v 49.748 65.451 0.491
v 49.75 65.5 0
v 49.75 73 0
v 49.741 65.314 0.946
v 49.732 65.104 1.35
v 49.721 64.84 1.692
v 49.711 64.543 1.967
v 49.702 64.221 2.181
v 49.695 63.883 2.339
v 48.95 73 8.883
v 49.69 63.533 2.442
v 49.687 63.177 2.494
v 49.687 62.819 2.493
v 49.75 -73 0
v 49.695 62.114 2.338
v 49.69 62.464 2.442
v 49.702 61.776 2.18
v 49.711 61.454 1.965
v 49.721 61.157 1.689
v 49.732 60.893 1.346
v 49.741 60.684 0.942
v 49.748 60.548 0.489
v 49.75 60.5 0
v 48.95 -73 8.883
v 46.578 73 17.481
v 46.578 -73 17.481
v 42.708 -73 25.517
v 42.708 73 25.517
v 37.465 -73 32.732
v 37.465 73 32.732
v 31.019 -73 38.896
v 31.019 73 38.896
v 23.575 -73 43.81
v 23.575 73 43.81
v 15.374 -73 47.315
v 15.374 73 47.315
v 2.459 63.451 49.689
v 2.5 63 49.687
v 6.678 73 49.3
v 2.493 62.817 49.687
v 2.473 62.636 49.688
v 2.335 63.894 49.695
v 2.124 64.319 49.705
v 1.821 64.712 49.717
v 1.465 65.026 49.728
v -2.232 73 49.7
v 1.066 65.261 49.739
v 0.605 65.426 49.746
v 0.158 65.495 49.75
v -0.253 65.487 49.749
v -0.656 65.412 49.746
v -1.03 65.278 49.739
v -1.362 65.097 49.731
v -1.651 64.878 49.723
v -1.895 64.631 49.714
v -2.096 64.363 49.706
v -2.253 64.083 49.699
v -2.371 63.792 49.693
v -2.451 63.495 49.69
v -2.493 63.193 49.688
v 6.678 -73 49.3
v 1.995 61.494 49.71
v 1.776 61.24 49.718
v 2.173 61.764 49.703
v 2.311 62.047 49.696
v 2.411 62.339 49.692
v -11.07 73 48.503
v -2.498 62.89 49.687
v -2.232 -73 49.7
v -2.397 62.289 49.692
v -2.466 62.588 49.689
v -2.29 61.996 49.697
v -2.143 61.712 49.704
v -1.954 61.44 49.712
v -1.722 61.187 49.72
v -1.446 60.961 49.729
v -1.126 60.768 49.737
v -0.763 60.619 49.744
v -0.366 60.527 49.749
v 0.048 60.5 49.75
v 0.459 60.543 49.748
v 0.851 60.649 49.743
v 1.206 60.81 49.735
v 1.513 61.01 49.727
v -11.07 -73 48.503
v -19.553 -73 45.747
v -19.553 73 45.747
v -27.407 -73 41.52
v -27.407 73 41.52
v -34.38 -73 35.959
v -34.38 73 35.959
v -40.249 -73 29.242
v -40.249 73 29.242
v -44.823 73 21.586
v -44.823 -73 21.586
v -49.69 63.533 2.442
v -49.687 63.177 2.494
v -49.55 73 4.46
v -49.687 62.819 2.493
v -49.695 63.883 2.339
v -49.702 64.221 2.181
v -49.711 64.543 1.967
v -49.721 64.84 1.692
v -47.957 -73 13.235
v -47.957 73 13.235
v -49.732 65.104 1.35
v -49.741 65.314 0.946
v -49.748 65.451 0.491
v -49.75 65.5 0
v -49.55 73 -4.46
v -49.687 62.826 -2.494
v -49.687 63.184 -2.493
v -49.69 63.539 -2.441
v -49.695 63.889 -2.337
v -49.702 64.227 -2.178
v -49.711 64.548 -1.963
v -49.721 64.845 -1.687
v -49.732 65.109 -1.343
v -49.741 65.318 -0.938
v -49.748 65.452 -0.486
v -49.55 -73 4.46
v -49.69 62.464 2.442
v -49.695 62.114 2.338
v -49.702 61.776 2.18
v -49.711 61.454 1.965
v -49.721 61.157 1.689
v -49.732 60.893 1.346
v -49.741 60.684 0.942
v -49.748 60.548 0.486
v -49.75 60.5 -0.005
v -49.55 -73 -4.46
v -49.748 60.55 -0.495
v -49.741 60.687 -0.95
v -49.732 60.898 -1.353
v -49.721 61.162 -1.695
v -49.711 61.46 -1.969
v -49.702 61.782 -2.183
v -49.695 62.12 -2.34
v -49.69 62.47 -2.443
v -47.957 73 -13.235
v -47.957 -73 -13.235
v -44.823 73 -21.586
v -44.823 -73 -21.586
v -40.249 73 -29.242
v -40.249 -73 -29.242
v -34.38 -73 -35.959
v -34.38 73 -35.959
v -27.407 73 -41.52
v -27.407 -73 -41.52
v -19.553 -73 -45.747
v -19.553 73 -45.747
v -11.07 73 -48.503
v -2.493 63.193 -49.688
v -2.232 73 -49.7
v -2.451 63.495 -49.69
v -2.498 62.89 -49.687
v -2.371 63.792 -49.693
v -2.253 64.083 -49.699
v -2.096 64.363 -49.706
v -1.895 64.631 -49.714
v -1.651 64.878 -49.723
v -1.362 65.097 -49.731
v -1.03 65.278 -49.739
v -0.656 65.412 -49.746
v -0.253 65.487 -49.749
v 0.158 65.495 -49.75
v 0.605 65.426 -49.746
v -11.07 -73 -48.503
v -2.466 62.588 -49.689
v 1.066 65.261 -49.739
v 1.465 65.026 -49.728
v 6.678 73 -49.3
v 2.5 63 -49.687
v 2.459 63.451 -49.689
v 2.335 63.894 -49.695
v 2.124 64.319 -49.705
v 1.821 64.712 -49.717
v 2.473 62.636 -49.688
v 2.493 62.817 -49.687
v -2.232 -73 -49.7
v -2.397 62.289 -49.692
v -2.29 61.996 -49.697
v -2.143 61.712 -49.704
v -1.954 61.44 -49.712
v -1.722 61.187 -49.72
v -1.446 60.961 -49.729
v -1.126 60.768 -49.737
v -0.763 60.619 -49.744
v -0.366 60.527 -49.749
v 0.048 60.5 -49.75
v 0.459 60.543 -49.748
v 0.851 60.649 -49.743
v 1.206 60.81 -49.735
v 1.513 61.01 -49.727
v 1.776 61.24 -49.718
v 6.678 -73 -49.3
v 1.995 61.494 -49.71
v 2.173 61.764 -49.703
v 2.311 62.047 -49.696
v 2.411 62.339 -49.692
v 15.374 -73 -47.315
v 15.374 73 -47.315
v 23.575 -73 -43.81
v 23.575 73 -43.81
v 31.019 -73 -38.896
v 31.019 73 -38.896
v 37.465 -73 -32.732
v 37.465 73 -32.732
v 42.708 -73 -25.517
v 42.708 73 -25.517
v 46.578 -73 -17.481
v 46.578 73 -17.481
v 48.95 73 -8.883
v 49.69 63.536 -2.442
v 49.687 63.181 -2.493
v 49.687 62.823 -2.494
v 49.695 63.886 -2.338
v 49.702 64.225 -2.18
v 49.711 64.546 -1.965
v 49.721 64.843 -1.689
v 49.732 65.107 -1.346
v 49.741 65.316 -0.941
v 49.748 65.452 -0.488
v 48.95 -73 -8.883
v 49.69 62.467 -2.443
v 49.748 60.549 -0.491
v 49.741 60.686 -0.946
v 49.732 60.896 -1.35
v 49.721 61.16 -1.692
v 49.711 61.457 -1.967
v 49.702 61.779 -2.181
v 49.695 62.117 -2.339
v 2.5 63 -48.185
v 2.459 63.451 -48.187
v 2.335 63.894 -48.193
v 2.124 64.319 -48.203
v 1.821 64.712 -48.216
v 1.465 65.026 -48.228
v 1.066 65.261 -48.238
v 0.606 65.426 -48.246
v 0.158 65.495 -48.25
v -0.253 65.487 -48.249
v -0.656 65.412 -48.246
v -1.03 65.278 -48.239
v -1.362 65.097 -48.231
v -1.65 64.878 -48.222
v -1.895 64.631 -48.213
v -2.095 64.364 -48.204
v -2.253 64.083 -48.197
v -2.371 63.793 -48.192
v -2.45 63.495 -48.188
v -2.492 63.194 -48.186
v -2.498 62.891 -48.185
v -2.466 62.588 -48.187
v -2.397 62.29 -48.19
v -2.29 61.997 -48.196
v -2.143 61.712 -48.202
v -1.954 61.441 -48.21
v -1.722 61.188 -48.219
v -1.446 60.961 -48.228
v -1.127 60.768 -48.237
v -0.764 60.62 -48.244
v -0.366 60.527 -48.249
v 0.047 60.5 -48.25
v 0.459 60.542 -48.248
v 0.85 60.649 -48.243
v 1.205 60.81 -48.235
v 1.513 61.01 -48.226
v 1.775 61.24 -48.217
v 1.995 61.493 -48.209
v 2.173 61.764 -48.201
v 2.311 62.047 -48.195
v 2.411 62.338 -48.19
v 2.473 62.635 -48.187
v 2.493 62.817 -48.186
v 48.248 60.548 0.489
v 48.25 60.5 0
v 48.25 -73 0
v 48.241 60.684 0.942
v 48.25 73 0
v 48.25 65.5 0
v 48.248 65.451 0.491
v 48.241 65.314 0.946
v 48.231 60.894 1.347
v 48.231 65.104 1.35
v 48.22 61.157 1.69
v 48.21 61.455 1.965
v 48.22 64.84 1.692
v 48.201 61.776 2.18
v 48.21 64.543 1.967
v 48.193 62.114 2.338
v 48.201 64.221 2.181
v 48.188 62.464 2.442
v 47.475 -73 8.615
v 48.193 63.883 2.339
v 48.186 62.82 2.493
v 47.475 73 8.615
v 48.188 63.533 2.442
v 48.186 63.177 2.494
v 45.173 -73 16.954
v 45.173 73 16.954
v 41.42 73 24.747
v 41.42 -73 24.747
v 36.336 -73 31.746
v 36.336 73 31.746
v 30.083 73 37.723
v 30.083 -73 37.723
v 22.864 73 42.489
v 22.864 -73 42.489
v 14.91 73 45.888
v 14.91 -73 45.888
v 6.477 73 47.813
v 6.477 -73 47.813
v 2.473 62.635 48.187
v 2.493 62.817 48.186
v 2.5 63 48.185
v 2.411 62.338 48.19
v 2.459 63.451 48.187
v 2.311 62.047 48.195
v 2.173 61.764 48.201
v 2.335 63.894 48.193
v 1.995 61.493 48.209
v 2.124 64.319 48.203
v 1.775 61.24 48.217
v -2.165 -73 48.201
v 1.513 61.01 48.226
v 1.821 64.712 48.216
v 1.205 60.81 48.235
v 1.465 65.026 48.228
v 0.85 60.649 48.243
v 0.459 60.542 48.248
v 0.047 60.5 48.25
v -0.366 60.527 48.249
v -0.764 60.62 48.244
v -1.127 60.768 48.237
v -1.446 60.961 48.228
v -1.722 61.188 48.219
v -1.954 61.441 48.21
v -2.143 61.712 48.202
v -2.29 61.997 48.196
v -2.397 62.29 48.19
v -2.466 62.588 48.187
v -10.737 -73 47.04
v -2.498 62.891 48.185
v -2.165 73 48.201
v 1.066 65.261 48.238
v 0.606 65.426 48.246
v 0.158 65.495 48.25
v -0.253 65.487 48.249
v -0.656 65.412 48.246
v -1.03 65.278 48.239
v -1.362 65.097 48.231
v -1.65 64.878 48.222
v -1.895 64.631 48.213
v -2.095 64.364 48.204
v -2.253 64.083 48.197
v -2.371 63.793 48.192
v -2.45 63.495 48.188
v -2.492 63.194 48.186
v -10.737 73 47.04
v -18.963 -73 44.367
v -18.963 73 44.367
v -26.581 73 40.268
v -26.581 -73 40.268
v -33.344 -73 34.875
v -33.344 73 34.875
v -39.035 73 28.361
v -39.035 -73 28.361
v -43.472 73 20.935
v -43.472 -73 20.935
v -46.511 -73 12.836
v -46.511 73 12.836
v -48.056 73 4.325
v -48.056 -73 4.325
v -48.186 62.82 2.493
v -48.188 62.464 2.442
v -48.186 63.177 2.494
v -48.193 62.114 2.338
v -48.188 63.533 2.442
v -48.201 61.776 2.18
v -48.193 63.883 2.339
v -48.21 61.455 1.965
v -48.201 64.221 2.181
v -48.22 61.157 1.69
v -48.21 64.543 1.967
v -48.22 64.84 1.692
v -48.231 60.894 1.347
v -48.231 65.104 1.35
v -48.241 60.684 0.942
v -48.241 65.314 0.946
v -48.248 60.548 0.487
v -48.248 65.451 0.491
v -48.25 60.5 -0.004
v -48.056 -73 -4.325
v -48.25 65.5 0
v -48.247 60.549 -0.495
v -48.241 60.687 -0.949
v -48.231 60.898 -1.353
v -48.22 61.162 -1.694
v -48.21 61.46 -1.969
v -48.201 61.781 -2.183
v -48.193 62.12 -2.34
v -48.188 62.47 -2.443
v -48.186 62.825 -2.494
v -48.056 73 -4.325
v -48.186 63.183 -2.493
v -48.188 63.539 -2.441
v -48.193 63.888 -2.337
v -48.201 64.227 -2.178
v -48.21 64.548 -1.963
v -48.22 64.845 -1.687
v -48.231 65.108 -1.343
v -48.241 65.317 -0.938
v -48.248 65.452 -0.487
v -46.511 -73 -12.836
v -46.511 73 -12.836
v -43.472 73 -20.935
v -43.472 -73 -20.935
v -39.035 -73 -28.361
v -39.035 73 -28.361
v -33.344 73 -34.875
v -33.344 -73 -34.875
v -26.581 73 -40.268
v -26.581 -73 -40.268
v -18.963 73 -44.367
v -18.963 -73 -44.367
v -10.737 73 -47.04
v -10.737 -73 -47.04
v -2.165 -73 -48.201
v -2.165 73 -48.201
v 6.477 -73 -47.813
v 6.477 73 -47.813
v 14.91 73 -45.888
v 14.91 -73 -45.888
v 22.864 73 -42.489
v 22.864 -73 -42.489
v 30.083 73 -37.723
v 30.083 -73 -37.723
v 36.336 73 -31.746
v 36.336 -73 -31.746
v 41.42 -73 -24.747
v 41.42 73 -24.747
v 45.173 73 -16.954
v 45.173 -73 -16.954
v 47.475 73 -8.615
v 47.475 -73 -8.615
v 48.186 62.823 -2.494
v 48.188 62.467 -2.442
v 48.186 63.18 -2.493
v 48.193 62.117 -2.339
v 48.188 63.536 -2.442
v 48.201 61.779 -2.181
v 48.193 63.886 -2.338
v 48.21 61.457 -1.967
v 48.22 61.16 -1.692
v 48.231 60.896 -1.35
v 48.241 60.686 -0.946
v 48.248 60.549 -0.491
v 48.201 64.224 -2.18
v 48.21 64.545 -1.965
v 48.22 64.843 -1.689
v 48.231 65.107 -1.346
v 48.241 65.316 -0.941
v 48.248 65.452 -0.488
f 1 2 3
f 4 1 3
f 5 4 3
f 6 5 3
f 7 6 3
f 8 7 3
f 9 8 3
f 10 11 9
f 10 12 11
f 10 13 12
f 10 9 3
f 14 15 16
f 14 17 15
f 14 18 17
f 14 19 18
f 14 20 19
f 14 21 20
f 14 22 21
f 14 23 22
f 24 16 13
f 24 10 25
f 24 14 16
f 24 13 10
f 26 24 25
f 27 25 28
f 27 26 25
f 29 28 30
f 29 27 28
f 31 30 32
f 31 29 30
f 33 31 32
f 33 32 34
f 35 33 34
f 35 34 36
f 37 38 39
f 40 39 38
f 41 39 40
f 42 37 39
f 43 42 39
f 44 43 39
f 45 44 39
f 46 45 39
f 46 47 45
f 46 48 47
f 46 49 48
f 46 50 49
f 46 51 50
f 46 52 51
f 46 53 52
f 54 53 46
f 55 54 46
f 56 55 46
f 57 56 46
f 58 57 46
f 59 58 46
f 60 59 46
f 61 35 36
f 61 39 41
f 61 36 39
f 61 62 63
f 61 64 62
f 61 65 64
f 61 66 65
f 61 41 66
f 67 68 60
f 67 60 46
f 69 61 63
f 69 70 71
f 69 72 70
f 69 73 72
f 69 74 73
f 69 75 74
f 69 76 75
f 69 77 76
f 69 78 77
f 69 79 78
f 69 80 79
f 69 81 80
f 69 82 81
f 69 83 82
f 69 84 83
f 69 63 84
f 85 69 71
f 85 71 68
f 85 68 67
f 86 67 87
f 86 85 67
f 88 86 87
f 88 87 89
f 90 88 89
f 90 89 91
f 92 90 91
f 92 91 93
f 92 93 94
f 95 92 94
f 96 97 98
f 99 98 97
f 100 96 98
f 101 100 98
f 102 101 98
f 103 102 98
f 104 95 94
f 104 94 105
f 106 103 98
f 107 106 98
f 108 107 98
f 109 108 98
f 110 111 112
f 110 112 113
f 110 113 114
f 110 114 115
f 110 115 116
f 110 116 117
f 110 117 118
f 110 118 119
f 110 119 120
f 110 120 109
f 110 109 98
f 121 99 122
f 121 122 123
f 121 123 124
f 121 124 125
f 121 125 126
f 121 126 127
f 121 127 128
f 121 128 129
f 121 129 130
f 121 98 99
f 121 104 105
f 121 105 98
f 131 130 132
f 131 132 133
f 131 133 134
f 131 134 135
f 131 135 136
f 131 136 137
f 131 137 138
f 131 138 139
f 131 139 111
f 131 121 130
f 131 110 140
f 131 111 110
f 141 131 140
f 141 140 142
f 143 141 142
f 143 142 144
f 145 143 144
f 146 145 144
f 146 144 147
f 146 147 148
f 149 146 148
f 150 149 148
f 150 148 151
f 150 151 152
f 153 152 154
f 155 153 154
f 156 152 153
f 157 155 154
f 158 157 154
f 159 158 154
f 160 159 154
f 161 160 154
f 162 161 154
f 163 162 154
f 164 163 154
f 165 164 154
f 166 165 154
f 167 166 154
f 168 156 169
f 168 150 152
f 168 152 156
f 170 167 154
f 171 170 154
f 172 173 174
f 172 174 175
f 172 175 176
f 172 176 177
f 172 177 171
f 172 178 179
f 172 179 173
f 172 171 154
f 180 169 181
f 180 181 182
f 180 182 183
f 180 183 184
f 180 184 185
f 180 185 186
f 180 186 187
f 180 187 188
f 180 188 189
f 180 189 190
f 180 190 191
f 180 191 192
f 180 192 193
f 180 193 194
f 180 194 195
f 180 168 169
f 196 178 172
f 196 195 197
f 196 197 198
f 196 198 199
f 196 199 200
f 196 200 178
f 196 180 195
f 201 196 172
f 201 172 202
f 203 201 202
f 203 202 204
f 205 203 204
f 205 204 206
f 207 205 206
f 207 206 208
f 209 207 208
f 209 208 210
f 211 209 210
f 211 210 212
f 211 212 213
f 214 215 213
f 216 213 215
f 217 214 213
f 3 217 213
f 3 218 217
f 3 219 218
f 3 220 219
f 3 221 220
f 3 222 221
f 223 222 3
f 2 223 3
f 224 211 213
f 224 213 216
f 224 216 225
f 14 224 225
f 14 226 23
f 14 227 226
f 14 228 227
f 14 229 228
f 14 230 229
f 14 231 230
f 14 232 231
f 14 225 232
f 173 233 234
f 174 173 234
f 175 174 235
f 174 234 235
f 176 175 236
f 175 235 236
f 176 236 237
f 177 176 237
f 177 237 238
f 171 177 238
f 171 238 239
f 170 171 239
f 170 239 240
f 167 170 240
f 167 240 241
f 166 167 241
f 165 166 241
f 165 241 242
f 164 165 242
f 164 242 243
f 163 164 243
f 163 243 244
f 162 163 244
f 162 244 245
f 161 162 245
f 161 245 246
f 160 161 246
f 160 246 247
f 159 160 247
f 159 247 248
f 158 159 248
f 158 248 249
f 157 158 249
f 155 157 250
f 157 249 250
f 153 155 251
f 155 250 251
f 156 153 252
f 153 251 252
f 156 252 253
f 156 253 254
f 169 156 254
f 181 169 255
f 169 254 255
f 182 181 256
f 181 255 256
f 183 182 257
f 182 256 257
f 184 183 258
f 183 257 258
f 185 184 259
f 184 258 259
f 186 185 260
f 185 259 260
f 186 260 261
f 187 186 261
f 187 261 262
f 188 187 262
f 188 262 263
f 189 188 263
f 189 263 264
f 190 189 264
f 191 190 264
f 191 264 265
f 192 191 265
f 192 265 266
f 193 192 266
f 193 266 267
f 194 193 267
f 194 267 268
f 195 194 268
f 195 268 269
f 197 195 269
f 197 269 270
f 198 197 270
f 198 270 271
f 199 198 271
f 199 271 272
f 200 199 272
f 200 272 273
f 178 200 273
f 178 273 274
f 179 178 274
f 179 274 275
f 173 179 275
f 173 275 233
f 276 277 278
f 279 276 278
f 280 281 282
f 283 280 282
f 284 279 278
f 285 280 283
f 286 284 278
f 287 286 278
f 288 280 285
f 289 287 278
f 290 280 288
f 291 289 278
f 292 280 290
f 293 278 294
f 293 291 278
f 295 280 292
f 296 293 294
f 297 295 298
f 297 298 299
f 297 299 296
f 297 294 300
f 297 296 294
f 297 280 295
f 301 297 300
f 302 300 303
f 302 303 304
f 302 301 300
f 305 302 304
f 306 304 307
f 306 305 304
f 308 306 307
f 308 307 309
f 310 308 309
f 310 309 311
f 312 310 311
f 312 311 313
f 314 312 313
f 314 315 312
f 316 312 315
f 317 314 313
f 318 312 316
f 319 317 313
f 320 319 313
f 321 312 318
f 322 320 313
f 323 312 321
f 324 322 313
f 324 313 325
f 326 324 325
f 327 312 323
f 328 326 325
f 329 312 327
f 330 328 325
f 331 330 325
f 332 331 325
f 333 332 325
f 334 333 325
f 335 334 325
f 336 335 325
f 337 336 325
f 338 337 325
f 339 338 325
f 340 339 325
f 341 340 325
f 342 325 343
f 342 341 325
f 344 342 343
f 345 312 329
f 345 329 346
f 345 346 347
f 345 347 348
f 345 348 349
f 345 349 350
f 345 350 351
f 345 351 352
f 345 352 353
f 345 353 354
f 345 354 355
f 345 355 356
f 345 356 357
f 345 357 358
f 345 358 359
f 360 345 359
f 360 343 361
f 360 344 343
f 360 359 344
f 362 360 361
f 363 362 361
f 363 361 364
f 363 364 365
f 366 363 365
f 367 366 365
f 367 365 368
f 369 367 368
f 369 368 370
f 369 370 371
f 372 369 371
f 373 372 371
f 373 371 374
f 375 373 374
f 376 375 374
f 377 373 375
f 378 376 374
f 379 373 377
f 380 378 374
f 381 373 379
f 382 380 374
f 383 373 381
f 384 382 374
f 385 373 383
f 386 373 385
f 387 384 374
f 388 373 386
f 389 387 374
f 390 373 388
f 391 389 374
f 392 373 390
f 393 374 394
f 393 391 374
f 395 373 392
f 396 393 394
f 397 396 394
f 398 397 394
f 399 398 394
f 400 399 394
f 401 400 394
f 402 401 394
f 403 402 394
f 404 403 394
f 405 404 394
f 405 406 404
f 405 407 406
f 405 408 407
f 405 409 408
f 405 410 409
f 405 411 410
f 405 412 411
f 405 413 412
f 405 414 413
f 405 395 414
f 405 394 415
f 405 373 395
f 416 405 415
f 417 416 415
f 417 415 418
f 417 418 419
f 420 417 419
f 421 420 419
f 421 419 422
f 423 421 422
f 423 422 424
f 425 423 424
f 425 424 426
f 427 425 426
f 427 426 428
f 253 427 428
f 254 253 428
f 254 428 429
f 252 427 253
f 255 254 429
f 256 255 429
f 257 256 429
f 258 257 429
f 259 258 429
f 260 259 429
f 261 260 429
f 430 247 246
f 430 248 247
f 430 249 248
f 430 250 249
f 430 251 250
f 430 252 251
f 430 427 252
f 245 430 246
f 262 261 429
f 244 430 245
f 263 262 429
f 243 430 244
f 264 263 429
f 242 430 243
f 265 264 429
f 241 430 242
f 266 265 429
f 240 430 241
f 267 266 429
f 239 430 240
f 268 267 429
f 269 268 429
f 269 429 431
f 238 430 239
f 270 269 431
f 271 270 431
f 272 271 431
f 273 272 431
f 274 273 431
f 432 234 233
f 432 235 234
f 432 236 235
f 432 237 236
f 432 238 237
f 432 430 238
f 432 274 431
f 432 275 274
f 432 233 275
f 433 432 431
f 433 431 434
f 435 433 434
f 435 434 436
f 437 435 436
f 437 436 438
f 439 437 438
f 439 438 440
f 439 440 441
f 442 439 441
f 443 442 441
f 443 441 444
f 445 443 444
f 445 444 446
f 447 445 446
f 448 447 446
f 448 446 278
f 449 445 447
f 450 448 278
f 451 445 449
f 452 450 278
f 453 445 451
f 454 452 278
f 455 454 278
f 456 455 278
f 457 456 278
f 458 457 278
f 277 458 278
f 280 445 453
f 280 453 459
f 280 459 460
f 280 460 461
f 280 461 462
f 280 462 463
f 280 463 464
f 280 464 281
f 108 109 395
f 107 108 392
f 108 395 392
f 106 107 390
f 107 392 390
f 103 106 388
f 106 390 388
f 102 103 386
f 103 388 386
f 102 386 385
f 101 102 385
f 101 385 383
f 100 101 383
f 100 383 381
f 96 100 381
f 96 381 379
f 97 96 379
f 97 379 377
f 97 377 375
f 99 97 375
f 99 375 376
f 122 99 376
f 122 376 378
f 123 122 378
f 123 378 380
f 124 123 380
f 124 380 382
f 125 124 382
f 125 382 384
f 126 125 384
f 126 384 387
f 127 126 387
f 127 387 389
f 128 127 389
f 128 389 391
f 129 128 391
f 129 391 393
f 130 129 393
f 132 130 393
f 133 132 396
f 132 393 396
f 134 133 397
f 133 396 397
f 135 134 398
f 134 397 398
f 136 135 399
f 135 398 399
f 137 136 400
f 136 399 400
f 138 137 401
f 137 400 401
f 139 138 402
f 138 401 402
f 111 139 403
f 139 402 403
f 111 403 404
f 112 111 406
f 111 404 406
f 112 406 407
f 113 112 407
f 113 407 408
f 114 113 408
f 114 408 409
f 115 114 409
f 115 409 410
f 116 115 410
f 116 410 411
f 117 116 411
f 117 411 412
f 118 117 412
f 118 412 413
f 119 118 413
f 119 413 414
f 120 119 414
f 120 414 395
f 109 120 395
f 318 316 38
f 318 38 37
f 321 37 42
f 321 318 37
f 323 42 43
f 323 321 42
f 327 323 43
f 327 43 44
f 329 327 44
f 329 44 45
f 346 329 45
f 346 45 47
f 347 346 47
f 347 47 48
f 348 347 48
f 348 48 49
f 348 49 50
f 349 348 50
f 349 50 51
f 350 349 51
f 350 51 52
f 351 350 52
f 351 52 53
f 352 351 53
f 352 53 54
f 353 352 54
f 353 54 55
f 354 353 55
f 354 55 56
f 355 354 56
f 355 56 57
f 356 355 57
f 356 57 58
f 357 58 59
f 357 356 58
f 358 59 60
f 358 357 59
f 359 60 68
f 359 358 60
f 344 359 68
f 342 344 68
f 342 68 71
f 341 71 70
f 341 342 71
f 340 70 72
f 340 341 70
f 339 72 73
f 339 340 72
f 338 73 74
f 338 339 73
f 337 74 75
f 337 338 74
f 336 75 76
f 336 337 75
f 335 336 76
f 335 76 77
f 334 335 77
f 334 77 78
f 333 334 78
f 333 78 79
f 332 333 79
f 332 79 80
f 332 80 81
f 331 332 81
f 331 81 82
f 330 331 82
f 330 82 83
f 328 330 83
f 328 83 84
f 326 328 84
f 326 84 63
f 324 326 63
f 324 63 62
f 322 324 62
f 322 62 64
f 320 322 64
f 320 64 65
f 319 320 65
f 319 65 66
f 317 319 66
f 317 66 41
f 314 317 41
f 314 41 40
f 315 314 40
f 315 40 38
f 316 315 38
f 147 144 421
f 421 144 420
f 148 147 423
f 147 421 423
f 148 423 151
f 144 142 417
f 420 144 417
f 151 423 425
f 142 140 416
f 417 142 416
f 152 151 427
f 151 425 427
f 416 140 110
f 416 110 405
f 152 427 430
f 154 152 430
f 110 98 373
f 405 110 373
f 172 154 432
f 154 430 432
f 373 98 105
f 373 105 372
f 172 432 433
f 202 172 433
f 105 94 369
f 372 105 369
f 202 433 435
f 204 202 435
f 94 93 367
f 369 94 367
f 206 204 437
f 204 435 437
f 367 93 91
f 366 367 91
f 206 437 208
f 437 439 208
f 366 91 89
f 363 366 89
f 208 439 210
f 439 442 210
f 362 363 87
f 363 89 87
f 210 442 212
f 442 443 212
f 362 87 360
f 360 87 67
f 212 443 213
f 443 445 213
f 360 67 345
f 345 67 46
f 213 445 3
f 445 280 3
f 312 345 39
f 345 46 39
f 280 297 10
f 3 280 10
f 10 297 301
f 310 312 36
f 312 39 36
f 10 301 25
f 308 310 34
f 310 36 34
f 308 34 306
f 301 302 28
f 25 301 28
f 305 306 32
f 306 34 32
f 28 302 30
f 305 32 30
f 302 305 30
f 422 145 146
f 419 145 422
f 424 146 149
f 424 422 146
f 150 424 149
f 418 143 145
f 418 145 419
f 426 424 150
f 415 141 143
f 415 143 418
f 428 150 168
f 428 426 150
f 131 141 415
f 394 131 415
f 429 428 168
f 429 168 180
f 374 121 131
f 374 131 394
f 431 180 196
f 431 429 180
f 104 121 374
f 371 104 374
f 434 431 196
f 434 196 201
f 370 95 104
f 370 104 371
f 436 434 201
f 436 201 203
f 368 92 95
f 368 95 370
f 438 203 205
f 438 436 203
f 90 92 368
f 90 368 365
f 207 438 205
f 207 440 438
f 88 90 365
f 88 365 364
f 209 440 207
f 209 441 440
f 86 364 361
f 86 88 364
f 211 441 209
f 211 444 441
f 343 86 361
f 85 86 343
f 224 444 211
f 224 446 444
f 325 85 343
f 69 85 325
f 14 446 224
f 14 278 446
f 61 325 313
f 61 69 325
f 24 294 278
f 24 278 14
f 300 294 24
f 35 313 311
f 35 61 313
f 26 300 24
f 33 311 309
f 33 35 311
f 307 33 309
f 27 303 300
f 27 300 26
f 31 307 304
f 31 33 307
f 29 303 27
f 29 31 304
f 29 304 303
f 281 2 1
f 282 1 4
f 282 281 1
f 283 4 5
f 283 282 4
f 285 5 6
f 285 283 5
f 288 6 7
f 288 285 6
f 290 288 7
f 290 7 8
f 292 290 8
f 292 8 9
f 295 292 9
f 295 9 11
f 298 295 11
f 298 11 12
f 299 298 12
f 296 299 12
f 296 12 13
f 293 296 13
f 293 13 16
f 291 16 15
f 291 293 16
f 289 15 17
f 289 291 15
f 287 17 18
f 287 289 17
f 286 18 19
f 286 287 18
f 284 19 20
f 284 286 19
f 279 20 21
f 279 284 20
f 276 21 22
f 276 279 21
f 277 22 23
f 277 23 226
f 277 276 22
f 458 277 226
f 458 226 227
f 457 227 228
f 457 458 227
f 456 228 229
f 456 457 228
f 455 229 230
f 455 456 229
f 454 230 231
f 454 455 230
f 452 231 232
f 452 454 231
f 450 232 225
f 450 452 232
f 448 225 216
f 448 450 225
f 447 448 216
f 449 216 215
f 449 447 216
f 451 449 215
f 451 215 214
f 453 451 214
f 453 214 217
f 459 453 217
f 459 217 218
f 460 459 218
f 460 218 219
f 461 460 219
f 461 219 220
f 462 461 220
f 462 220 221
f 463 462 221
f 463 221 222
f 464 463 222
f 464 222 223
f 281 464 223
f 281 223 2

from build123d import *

# Parameters (mm, degrees)
F0_R          = 49.75
F0_R_2        = 48.25
F1_DEPTH      = 73
F3_R          = 2.5
F4_DEPTH      = 49.751
F4_DEPTH_BACK = 49.751
F2_R          = 2.5
F5_DEPTH      = 49.7510001
F5_DEPTH_BACK = 49.7510001


with BuildPart() as f1:
    # F0 (on Front) → F1 (new body, symmetric)
    with BuildSketch(Plane.XZ):
        Circle(F0_R)
        Circle(F0_R_2, mode=Mode.SUBTRACT)
    extrude(amount=F1_DEPTH, both=True)

    # F3 (on Right) → F4 (cut, two sides)
    with BuildSketch(Plane.YZ) as f4_sk:
        with Locations((63, 0)):
            Circle(F3_R)
    extrude(amount=F4_DEPTH, mode=Mode.SUBTRACT)
    extrude(f4_sk.sketch, amount=-F4_DEPTH_BACK, mode=Mode.SUBTRACT)

    # F2 (on Top) → F5 (cut, two sides)
    with BuildSketch(Plane.XY) as f5_sk:
        with Locations((0, 63)):
            Circle(F2_R)
    extrude(amount=-F5_DEPTH, mode=Mode.SUBTRACT)
    extrude(f5_sk.sketch, amount=F5_DEPTH_BACK, mode=Mode.SUBTRACT)


solid = f1.part
